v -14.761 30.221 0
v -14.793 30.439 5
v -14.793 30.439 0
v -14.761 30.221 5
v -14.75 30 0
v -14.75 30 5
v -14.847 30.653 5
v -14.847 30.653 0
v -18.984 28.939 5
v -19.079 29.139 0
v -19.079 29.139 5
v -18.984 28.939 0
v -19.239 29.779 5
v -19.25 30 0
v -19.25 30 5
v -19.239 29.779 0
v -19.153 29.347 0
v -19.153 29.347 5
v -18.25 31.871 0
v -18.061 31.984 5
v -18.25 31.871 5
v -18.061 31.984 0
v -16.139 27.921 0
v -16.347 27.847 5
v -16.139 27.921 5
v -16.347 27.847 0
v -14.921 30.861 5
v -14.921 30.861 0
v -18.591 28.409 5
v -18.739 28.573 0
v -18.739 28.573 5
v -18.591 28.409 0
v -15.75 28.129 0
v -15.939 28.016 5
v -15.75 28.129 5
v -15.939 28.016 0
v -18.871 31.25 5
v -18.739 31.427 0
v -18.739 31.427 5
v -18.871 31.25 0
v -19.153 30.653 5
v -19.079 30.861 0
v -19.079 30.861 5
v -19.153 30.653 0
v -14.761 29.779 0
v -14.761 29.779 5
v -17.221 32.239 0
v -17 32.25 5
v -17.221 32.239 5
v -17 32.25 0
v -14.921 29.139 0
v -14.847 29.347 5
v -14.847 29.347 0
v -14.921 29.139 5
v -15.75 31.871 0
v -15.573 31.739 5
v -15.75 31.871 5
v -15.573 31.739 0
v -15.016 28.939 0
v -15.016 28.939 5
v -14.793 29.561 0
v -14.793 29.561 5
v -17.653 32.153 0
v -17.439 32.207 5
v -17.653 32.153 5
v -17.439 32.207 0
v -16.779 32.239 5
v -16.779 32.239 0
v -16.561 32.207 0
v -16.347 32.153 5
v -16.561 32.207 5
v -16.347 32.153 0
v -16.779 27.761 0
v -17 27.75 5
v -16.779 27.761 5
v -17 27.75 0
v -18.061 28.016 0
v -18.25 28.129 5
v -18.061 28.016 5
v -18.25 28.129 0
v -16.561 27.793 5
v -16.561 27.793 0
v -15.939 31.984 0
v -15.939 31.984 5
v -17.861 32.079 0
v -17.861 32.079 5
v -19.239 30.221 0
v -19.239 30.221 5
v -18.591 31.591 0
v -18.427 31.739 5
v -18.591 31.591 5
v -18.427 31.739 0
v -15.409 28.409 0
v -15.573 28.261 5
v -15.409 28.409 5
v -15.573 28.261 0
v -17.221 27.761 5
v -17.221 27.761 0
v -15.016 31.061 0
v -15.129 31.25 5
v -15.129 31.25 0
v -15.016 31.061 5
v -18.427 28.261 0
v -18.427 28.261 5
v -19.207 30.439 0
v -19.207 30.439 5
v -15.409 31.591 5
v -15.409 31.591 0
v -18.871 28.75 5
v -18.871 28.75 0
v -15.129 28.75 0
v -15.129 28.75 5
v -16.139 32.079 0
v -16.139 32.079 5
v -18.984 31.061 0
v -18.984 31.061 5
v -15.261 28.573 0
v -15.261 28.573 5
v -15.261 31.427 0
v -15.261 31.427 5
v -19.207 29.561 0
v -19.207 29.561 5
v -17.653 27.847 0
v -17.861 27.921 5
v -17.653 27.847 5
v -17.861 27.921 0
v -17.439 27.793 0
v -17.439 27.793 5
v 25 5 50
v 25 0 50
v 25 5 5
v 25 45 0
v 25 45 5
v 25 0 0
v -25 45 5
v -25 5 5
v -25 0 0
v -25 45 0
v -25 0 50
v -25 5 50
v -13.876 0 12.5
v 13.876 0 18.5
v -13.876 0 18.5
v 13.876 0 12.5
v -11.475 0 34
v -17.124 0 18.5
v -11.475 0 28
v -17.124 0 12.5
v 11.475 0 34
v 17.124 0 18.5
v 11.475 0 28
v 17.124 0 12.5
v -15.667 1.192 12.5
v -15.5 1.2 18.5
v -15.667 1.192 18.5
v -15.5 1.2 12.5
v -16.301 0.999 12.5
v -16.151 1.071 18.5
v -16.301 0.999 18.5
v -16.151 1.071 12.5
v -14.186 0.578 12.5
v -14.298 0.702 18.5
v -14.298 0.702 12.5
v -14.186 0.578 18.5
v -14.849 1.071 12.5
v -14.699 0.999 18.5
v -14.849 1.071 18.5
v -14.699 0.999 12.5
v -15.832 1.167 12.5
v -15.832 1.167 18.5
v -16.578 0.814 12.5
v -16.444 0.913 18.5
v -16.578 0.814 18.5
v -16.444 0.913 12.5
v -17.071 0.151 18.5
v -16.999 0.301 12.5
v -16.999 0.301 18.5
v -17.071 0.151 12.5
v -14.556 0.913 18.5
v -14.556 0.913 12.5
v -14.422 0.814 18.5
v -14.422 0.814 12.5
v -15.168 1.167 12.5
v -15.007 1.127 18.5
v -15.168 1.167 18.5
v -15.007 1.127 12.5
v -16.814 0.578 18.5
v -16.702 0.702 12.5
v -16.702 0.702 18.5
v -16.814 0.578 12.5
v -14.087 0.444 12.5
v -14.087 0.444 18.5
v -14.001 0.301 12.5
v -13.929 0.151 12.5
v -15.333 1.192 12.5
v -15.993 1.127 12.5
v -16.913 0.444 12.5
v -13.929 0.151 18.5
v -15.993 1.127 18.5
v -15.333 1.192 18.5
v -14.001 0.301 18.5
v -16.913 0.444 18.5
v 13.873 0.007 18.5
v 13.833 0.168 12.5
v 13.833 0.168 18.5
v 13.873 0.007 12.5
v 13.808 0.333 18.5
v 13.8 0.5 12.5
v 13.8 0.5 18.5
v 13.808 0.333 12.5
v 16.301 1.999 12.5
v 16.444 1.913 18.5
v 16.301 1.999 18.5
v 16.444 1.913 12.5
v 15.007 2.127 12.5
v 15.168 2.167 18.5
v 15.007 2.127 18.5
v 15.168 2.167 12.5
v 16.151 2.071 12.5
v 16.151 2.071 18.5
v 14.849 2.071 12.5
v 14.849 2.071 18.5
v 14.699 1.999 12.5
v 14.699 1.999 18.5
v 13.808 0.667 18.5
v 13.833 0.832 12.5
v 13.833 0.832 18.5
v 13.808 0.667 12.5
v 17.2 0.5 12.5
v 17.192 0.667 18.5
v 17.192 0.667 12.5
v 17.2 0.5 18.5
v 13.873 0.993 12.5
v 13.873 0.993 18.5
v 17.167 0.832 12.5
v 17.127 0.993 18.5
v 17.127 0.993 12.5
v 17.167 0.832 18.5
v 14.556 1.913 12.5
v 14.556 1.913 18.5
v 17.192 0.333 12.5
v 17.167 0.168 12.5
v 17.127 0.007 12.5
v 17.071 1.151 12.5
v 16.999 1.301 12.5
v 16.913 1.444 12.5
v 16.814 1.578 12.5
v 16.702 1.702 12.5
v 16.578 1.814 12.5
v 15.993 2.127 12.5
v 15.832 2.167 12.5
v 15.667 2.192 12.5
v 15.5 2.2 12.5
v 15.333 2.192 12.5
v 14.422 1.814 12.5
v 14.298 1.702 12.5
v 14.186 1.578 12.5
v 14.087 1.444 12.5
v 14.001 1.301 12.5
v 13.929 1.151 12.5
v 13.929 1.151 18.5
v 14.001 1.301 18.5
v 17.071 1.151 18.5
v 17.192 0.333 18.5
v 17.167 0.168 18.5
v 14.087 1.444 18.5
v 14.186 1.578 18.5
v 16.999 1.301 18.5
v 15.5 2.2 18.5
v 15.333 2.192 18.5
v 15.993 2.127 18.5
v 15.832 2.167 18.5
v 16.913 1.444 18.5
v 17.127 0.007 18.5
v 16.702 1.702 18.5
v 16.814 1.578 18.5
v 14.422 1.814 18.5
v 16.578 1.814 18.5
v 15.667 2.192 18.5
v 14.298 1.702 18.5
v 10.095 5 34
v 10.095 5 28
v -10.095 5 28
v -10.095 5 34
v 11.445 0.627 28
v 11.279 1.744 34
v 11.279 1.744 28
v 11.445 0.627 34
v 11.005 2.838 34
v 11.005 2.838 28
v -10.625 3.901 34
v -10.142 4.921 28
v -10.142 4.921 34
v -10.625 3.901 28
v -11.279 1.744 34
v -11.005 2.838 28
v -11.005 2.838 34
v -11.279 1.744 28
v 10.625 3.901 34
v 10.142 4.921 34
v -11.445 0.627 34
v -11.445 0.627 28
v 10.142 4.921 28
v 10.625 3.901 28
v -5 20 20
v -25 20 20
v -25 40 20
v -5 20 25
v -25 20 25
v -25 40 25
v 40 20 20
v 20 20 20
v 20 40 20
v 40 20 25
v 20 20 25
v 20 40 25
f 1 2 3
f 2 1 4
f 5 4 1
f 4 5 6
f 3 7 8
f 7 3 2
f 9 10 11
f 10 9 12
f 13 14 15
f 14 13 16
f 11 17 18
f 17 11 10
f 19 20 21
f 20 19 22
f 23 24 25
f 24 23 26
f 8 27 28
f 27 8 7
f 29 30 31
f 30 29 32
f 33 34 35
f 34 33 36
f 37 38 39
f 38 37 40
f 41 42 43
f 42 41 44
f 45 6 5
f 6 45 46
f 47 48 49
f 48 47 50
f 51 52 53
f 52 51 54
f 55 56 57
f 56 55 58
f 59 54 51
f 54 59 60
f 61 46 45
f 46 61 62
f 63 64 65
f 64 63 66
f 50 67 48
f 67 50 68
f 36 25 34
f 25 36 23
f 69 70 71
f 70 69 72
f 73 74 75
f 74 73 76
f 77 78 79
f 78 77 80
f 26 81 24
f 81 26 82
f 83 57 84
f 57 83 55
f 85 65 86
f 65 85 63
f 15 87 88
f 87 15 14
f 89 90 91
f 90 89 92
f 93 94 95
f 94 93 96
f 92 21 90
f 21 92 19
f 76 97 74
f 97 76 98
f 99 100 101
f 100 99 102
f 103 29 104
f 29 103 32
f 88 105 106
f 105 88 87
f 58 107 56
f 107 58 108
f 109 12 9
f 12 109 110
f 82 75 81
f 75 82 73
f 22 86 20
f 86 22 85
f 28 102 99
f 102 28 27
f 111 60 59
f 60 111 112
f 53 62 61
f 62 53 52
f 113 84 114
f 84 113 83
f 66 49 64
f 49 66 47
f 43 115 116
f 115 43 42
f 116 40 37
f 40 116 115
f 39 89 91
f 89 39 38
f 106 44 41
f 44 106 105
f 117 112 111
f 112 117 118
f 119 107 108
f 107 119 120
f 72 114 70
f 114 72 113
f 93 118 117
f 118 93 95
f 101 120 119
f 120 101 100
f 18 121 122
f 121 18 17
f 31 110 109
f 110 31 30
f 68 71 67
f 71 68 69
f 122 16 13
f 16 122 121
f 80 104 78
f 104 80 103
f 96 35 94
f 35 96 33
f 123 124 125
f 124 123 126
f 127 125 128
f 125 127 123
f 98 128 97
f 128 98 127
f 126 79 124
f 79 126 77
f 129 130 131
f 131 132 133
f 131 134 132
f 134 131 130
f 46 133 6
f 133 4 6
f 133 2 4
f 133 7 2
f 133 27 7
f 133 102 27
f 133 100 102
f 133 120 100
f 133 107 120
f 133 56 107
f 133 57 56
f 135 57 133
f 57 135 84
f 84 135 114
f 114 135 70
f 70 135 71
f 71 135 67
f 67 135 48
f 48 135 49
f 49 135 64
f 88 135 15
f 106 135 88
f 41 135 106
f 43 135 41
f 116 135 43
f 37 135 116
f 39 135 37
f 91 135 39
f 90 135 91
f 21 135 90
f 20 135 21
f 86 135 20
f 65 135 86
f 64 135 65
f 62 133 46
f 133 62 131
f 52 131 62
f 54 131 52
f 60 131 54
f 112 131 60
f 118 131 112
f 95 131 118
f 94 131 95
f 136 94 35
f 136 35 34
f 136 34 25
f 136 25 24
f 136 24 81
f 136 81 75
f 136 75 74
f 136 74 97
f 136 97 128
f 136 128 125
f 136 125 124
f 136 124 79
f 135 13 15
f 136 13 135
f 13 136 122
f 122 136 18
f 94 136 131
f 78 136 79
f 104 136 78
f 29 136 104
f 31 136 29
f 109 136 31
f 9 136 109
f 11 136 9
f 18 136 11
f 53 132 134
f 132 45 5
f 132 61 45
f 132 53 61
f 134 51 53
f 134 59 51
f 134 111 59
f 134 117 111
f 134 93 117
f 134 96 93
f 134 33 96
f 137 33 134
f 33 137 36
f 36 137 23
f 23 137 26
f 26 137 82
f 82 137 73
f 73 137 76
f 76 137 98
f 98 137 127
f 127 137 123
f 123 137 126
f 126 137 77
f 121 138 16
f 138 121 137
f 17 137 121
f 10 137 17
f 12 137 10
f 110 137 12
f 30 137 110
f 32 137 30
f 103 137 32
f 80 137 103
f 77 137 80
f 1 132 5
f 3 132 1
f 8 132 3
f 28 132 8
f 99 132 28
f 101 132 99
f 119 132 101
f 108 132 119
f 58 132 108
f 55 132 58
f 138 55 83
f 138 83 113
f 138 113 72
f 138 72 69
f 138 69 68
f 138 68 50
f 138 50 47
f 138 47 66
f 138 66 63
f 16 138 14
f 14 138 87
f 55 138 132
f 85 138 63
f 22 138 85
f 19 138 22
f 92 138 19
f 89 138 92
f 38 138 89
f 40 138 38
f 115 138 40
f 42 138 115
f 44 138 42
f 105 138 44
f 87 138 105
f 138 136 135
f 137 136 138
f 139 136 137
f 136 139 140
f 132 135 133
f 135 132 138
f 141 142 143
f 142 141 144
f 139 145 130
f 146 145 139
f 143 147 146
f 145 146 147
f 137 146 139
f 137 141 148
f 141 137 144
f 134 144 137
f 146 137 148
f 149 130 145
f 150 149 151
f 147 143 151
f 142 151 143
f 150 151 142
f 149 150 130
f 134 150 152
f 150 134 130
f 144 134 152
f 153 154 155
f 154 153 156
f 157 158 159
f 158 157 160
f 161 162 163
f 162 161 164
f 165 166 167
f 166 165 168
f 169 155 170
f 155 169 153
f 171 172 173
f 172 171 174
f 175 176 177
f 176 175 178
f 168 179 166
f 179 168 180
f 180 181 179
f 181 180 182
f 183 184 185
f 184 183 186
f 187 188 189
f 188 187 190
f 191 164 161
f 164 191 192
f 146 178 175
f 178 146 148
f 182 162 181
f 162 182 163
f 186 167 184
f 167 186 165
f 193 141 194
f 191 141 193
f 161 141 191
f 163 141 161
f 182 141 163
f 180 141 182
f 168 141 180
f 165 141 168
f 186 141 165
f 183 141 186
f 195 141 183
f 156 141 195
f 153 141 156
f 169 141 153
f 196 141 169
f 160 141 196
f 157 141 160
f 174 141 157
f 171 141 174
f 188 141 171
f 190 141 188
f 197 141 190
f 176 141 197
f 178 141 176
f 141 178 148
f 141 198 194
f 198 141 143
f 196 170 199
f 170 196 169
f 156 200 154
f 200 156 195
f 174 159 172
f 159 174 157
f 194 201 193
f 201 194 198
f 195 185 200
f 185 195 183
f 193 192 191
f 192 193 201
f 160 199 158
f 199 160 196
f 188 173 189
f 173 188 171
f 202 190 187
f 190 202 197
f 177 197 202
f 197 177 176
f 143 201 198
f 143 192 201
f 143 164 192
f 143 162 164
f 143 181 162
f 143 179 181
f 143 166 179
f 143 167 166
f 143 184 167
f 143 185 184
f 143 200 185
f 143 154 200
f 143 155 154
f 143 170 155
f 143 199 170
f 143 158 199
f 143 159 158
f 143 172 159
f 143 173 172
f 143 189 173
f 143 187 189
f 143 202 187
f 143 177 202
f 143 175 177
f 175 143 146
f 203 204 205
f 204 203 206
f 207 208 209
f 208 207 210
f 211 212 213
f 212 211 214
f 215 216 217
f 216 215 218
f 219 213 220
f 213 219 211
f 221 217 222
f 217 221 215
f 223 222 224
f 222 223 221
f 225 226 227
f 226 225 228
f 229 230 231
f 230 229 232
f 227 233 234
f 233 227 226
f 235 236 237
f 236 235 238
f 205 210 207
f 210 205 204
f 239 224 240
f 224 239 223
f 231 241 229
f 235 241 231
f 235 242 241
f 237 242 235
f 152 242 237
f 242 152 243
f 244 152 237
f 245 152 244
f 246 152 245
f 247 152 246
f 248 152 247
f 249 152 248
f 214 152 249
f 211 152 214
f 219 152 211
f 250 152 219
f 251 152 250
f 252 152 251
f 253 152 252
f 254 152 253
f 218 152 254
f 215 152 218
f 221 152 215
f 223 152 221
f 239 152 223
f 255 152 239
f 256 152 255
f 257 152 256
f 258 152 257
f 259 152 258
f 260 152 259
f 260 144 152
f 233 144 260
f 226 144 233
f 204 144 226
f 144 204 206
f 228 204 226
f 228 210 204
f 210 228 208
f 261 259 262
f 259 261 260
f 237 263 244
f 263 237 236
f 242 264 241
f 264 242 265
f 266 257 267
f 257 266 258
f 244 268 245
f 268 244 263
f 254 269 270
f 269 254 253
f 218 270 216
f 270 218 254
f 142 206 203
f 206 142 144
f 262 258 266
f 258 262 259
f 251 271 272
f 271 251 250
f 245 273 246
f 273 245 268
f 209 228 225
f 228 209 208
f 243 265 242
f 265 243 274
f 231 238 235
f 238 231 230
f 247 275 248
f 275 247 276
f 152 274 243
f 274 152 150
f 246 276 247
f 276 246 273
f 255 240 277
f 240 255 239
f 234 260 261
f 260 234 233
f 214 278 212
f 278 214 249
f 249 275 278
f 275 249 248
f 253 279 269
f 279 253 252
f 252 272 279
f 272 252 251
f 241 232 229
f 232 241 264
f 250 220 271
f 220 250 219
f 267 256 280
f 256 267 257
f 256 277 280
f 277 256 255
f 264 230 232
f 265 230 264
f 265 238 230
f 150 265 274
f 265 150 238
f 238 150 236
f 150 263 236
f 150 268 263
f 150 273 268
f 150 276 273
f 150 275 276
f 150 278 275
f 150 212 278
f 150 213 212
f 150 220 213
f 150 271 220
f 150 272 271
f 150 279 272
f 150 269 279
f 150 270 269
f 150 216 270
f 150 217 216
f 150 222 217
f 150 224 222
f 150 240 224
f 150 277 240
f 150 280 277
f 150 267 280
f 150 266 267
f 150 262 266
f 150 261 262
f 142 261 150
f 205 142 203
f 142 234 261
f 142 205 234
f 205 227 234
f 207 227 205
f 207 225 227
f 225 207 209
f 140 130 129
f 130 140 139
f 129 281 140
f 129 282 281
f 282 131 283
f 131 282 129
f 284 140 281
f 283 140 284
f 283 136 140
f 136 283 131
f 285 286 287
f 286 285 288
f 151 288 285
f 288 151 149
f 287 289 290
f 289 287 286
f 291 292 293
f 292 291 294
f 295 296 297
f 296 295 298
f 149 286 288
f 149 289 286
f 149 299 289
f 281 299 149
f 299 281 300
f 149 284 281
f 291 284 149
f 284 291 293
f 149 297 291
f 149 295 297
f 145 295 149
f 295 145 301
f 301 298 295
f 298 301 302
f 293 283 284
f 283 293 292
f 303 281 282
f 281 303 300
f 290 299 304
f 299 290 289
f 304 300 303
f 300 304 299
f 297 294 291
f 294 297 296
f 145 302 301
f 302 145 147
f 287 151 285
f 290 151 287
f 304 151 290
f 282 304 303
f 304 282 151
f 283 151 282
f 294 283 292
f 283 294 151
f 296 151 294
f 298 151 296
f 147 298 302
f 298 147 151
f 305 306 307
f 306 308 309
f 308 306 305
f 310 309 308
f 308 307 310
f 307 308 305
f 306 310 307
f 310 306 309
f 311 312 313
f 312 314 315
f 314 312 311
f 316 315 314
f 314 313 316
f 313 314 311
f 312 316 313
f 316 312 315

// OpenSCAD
// L-shaped mounting bracket for a NEMA 17 stepper motor (e.g. syringe pump)
// Print orientation: base plate on the bed, motor plate builds upward.

$fn = 64;

// ---- Base plate ----
base_x1 = -25;      // base plate x start
base_x2 = 25;       // base plate x end
base_y1 = 0;        // base plate y start
base_y2 = 45;       // base plate y end
base_z1 = 0;        // base plate z start
base_z2 = 5;        // base plate z end

// ---- Motor plate ----
motor_x1 = -25;     // motor plate x start
motor_x2 = 25;      // motor plate x end
motor_y1 = 0;       // motor plate y start
motor_y2 = 5;       // motor plate y end
motor_z1 = 0;       // motor plate z start
motor_z2 = 50;      // motor plate z end

// ---- Boss hole ----
boss_d = 23;        // boss hole diameter
boss_x = 0;         // boss hole x centre
boss_z = 28;        // boss hole z centre

// ---- Screw holes ----
screw_d = 3.4;      // M3 screw hole diameter
screw_pitch = 31;   // square pattern side length
screw_n = 4;        // number of screw holes

// ---- Gussets ----
gusset_t = 5;       // gusset thickness (X)
gusset_y = 20;      // gusset leg along +Y
gusset_z = 20;      // gusset leg along +Z

// ---- Through holes ----
th_d = 4.5;         // vertical through-hole diameter (M4)
th_x = -17;         // through-hole x position
th_y = 30;          // through-hole y position

// ---- Cutting overshoot ----
eps = 0.5;          // extension past faces for clean cuts

union() {
    // Base plate with through-holes
    difference() {
        translate([base_x1, base_y1, base_z1])
            cube([base_x2 - base_x1, base_y2 - base_y1, base_z2 - base_z1]);
        for (i = [0 : screw_n - 1]) {
            rotate([0, 0, i * 90])
                translate([th_x, th_y, -eps])
                    cylinder(d = th_d, h = base_z2 - base_z1 + 2 * eps);
        }
    }

    // Motor plate with boss hole and screw holes
    difference() {
        translate([motor_x1, motor_y1, motor_z1])
            cube([motor_x2 - motor_x1, motor_y2 - motor_y1, motor_z2 - motor_z1]);
        translate([boss_x, -eps, boss_z])
            cylinder(d = boss_d, h = motor_y2 - motor_y1 + 2 * eps);
        for (i = [0 : screw_n - 1]) {
            rotate([0, 0, i * 90])
                translate([-screw_pitch / 2, -eps, boss_z - screw_pitch / 2])
                    cylinder(d = screw_d, h = motor_y2 - motor_y1 + 2 * eps);
        }
    }

    // Gussets, flush with left and right edges
    for (sx = [-1, 1]) {
        x0 = sx > 0 ? motor_x2 - gusset_t : motor_x1;
        translate([x0, gusset_y, gusset_z])
            linear_extrude(gusset_t)
                polygon([[0, 0], [gusset_y, 0], [0, gusset_z]]);
    }
}
